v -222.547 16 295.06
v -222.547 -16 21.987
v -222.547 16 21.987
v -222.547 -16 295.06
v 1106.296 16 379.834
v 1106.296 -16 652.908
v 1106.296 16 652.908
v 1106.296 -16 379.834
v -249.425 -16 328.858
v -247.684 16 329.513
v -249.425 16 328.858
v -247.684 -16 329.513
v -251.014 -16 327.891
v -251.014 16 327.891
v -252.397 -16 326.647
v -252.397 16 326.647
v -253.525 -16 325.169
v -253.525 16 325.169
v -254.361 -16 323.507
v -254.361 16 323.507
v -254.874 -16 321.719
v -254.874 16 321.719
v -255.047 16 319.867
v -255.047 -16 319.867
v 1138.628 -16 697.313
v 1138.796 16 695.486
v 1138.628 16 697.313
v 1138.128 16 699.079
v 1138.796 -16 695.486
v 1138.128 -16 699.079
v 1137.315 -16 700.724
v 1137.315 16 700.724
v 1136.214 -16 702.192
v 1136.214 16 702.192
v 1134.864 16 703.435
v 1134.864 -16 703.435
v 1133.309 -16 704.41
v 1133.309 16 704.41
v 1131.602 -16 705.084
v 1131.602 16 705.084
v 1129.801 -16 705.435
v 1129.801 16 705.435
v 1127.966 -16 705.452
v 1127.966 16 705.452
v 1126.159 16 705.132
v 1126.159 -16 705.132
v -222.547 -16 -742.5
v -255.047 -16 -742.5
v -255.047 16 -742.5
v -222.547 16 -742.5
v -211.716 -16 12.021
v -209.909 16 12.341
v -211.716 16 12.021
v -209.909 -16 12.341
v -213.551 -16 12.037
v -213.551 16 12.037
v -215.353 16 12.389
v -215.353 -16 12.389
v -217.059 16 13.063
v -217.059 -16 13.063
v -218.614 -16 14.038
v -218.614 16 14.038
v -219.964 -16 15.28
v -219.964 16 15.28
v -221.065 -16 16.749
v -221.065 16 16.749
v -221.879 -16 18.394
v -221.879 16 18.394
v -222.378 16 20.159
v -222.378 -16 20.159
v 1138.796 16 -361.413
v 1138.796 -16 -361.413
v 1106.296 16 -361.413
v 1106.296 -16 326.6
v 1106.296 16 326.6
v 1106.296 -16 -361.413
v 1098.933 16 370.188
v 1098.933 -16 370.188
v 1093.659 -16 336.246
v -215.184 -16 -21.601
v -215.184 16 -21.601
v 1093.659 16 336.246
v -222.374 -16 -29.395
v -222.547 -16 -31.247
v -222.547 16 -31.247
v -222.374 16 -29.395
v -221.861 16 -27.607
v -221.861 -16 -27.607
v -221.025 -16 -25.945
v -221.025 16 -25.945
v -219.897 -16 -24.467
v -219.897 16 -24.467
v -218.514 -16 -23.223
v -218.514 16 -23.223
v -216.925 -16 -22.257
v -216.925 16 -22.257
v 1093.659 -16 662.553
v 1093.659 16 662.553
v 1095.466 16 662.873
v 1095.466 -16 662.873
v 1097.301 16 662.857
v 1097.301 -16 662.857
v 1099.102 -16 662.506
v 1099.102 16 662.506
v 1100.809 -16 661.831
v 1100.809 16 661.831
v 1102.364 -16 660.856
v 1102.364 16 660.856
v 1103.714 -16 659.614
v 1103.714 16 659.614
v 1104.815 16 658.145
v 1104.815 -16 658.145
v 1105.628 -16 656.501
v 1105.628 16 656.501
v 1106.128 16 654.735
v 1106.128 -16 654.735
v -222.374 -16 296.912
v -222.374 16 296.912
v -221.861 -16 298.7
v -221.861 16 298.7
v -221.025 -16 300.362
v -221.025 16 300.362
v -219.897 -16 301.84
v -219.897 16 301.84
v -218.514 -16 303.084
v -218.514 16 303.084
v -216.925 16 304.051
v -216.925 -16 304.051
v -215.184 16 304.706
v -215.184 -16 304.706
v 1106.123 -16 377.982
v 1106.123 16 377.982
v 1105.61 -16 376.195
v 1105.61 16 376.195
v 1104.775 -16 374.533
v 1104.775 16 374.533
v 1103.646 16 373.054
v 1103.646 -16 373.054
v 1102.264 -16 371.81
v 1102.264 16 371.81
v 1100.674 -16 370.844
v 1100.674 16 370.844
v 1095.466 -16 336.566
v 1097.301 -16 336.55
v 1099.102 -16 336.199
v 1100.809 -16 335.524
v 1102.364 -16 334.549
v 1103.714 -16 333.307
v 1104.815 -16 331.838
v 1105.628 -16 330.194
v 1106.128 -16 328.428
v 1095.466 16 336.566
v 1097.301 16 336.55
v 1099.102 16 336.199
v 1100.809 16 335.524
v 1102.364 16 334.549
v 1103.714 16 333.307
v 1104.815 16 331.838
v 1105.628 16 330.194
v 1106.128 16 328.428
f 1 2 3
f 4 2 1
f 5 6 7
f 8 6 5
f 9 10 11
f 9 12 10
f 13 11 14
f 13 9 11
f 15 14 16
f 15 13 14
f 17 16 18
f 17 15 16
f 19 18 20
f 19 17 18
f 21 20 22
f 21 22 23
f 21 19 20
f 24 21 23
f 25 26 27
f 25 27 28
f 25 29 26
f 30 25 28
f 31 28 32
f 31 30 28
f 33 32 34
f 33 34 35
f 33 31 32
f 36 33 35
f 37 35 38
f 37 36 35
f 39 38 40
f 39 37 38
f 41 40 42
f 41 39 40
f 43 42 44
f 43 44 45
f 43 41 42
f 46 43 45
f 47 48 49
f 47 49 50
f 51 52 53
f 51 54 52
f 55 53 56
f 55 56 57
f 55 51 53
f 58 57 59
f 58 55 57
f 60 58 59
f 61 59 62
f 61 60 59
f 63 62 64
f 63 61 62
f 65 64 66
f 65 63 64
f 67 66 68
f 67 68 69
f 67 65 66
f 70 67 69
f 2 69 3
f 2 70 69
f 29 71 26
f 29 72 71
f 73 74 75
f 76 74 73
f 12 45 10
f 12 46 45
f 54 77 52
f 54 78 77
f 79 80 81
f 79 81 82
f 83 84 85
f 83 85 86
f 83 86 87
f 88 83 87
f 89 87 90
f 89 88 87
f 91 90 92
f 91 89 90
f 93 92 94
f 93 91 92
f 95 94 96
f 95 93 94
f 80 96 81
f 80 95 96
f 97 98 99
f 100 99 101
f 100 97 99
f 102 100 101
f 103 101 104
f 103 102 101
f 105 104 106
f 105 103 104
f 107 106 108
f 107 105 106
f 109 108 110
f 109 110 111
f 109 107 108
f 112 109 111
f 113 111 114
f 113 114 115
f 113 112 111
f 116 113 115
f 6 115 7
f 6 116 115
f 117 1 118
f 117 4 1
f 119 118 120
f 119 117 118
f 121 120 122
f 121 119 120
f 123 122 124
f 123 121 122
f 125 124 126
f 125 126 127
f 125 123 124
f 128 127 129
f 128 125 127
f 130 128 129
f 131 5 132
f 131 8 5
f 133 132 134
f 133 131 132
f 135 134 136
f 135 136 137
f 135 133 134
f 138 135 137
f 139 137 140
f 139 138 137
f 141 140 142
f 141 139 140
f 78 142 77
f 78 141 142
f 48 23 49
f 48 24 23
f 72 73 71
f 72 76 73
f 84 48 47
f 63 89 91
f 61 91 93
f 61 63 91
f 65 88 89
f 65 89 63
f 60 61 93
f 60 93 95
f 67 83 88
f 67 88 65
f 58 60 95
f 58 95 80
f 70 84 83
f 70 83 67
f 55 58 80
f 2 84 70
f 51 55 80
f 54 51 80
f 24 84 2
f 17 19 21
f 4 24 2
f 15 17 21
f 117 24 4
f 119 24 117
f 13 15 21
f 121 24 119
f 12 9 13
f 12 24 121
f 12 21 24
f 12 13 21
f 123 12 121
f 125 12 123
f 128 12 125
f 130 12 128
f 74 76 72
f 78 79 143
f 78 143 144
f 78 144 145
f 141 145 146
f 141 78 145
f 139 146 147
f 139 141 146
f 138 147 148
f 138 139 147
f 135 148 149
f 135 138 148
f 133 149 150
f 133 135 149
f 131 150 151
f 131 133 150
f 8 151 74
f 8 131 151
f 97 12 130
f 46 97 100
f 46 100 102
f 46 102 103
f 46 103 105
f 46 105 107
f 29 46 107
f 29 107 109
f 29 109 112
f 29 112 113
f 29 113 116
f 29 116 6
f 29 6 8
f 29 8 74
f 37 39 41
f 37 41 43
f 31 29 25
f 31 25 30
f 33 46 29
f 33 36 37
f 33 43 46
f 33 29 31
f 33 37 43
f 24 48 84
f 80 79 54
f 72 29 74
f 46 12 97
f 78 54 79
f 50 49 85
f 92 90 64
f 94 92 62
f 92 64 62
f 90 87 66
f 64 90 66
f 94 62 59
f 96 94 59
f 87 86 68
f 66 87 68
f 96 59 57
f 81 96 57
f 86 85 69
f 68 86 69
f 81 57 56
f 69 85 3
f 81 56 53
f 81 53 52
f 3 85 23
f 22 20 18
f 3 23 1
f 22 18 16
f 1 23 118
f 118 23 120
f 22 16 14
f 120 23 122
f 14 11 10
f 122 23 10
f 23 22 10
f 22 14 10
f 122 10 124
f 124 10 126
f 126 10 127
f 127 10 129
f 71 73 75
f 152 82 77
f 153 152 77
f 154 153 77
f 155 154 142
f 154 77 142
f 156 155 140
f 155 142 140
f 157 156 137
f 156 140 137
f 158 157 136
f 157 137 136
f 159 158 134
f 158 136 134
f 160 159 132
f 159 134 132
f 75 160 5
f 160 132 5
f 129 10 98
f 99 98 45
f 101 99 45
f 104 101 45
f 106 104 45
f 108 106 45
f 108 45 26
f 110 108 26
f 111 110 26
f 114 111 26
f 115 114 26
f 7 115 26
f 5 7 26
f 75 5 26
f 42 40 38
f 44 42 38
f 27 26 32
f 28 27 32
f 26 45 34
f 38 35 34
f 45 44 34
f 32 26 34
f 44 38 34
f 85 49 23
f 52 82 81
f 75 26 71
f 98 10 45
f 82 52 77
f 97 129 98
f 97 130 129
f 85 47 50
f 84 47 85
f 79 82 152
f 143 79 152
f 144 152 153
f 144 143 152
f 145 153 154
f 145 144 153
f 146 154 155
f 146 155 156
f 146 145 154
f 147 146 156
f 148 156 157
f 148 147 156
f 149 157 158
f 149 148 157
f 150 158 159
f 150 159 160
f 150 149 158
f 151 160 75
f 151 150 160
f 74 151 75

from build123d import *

# Parameters (mm, degrees)
F1_DEPTH = 16


with BuildPart() as f1:
    # F0 (on Front) → F1 (new body, symmetric)
    with BuildSketch(Plane.XZ):
        with BuildLine():
            Line((-255.046532, 319.867053), (-255.046532, -742.5))
            Line((-255.046532, -742.5), (-222.546532, -742.5))
            Line((-222.546532, -742.5), (-222.546532, -31.247201))
            ThreePointArc((-222.546532, -31.247201), (-220.495519, -25.17978), (-215.183813, -21.60123))
            Line((-215.183813, -21.60123), (1093.658919, 336.246306))
            ThreePointArc((1093.658919, 336.246306), (1102.363621, 334.549323), (1106.2962, 326.600335))
            Line((1106.2962, 326.600335), (1106.2962, -361.412819))
            Line((1106.2962, -361.412819), (1138.7962, -361.412819))
            Line((1138.7962, -361.412819), (1138.7962, 695.486082))
            ThreePointArc((1138.7962, 695.486082), (1134.863621, 703.43507), (1126.158919, 705.132052))
            Line((1126.158919, 705.132052), (-247.683813, 329.513023))
            ThreePointArc((-247.683813, 329.513023), (-252.995519, 325.934473), (-255.046532, 319.867053))
        make_face()
        with BuildLine():
            ThreePointArc((1093.658919, 662.55348), (1102.363621, 660.856497), (1106.2962, 652.90751))
            Line((1106.2962, 652.90751), (1106.2962, 379.834382))
            ThreePointArc((1106.2962, 379.834382), (1104.245188, 373.766961), (1098.933482, 370.188411))
            Line((1098.933482, 370.188411), (-209.90925, 12.340875))
            ThreePointArc((-209.90925, 12.340875), (-218.613952, 14.037858), (-222.546532, 21.986846))
            Line((-222.546532, 21.986846), (-222.546532, 295.059974))
            ThreePointArc((-222.546532, 295.059974), (-220.495519, 301.127394), (-215.183813, 304.705944))
            Line((-215.183813, 304.705944), (1093.658919, 662.55348))
        make_face(mode=Mode.SUBTRACT)
    extrude(amount=F1_DEPTH, both=True)


solid = f1.part
